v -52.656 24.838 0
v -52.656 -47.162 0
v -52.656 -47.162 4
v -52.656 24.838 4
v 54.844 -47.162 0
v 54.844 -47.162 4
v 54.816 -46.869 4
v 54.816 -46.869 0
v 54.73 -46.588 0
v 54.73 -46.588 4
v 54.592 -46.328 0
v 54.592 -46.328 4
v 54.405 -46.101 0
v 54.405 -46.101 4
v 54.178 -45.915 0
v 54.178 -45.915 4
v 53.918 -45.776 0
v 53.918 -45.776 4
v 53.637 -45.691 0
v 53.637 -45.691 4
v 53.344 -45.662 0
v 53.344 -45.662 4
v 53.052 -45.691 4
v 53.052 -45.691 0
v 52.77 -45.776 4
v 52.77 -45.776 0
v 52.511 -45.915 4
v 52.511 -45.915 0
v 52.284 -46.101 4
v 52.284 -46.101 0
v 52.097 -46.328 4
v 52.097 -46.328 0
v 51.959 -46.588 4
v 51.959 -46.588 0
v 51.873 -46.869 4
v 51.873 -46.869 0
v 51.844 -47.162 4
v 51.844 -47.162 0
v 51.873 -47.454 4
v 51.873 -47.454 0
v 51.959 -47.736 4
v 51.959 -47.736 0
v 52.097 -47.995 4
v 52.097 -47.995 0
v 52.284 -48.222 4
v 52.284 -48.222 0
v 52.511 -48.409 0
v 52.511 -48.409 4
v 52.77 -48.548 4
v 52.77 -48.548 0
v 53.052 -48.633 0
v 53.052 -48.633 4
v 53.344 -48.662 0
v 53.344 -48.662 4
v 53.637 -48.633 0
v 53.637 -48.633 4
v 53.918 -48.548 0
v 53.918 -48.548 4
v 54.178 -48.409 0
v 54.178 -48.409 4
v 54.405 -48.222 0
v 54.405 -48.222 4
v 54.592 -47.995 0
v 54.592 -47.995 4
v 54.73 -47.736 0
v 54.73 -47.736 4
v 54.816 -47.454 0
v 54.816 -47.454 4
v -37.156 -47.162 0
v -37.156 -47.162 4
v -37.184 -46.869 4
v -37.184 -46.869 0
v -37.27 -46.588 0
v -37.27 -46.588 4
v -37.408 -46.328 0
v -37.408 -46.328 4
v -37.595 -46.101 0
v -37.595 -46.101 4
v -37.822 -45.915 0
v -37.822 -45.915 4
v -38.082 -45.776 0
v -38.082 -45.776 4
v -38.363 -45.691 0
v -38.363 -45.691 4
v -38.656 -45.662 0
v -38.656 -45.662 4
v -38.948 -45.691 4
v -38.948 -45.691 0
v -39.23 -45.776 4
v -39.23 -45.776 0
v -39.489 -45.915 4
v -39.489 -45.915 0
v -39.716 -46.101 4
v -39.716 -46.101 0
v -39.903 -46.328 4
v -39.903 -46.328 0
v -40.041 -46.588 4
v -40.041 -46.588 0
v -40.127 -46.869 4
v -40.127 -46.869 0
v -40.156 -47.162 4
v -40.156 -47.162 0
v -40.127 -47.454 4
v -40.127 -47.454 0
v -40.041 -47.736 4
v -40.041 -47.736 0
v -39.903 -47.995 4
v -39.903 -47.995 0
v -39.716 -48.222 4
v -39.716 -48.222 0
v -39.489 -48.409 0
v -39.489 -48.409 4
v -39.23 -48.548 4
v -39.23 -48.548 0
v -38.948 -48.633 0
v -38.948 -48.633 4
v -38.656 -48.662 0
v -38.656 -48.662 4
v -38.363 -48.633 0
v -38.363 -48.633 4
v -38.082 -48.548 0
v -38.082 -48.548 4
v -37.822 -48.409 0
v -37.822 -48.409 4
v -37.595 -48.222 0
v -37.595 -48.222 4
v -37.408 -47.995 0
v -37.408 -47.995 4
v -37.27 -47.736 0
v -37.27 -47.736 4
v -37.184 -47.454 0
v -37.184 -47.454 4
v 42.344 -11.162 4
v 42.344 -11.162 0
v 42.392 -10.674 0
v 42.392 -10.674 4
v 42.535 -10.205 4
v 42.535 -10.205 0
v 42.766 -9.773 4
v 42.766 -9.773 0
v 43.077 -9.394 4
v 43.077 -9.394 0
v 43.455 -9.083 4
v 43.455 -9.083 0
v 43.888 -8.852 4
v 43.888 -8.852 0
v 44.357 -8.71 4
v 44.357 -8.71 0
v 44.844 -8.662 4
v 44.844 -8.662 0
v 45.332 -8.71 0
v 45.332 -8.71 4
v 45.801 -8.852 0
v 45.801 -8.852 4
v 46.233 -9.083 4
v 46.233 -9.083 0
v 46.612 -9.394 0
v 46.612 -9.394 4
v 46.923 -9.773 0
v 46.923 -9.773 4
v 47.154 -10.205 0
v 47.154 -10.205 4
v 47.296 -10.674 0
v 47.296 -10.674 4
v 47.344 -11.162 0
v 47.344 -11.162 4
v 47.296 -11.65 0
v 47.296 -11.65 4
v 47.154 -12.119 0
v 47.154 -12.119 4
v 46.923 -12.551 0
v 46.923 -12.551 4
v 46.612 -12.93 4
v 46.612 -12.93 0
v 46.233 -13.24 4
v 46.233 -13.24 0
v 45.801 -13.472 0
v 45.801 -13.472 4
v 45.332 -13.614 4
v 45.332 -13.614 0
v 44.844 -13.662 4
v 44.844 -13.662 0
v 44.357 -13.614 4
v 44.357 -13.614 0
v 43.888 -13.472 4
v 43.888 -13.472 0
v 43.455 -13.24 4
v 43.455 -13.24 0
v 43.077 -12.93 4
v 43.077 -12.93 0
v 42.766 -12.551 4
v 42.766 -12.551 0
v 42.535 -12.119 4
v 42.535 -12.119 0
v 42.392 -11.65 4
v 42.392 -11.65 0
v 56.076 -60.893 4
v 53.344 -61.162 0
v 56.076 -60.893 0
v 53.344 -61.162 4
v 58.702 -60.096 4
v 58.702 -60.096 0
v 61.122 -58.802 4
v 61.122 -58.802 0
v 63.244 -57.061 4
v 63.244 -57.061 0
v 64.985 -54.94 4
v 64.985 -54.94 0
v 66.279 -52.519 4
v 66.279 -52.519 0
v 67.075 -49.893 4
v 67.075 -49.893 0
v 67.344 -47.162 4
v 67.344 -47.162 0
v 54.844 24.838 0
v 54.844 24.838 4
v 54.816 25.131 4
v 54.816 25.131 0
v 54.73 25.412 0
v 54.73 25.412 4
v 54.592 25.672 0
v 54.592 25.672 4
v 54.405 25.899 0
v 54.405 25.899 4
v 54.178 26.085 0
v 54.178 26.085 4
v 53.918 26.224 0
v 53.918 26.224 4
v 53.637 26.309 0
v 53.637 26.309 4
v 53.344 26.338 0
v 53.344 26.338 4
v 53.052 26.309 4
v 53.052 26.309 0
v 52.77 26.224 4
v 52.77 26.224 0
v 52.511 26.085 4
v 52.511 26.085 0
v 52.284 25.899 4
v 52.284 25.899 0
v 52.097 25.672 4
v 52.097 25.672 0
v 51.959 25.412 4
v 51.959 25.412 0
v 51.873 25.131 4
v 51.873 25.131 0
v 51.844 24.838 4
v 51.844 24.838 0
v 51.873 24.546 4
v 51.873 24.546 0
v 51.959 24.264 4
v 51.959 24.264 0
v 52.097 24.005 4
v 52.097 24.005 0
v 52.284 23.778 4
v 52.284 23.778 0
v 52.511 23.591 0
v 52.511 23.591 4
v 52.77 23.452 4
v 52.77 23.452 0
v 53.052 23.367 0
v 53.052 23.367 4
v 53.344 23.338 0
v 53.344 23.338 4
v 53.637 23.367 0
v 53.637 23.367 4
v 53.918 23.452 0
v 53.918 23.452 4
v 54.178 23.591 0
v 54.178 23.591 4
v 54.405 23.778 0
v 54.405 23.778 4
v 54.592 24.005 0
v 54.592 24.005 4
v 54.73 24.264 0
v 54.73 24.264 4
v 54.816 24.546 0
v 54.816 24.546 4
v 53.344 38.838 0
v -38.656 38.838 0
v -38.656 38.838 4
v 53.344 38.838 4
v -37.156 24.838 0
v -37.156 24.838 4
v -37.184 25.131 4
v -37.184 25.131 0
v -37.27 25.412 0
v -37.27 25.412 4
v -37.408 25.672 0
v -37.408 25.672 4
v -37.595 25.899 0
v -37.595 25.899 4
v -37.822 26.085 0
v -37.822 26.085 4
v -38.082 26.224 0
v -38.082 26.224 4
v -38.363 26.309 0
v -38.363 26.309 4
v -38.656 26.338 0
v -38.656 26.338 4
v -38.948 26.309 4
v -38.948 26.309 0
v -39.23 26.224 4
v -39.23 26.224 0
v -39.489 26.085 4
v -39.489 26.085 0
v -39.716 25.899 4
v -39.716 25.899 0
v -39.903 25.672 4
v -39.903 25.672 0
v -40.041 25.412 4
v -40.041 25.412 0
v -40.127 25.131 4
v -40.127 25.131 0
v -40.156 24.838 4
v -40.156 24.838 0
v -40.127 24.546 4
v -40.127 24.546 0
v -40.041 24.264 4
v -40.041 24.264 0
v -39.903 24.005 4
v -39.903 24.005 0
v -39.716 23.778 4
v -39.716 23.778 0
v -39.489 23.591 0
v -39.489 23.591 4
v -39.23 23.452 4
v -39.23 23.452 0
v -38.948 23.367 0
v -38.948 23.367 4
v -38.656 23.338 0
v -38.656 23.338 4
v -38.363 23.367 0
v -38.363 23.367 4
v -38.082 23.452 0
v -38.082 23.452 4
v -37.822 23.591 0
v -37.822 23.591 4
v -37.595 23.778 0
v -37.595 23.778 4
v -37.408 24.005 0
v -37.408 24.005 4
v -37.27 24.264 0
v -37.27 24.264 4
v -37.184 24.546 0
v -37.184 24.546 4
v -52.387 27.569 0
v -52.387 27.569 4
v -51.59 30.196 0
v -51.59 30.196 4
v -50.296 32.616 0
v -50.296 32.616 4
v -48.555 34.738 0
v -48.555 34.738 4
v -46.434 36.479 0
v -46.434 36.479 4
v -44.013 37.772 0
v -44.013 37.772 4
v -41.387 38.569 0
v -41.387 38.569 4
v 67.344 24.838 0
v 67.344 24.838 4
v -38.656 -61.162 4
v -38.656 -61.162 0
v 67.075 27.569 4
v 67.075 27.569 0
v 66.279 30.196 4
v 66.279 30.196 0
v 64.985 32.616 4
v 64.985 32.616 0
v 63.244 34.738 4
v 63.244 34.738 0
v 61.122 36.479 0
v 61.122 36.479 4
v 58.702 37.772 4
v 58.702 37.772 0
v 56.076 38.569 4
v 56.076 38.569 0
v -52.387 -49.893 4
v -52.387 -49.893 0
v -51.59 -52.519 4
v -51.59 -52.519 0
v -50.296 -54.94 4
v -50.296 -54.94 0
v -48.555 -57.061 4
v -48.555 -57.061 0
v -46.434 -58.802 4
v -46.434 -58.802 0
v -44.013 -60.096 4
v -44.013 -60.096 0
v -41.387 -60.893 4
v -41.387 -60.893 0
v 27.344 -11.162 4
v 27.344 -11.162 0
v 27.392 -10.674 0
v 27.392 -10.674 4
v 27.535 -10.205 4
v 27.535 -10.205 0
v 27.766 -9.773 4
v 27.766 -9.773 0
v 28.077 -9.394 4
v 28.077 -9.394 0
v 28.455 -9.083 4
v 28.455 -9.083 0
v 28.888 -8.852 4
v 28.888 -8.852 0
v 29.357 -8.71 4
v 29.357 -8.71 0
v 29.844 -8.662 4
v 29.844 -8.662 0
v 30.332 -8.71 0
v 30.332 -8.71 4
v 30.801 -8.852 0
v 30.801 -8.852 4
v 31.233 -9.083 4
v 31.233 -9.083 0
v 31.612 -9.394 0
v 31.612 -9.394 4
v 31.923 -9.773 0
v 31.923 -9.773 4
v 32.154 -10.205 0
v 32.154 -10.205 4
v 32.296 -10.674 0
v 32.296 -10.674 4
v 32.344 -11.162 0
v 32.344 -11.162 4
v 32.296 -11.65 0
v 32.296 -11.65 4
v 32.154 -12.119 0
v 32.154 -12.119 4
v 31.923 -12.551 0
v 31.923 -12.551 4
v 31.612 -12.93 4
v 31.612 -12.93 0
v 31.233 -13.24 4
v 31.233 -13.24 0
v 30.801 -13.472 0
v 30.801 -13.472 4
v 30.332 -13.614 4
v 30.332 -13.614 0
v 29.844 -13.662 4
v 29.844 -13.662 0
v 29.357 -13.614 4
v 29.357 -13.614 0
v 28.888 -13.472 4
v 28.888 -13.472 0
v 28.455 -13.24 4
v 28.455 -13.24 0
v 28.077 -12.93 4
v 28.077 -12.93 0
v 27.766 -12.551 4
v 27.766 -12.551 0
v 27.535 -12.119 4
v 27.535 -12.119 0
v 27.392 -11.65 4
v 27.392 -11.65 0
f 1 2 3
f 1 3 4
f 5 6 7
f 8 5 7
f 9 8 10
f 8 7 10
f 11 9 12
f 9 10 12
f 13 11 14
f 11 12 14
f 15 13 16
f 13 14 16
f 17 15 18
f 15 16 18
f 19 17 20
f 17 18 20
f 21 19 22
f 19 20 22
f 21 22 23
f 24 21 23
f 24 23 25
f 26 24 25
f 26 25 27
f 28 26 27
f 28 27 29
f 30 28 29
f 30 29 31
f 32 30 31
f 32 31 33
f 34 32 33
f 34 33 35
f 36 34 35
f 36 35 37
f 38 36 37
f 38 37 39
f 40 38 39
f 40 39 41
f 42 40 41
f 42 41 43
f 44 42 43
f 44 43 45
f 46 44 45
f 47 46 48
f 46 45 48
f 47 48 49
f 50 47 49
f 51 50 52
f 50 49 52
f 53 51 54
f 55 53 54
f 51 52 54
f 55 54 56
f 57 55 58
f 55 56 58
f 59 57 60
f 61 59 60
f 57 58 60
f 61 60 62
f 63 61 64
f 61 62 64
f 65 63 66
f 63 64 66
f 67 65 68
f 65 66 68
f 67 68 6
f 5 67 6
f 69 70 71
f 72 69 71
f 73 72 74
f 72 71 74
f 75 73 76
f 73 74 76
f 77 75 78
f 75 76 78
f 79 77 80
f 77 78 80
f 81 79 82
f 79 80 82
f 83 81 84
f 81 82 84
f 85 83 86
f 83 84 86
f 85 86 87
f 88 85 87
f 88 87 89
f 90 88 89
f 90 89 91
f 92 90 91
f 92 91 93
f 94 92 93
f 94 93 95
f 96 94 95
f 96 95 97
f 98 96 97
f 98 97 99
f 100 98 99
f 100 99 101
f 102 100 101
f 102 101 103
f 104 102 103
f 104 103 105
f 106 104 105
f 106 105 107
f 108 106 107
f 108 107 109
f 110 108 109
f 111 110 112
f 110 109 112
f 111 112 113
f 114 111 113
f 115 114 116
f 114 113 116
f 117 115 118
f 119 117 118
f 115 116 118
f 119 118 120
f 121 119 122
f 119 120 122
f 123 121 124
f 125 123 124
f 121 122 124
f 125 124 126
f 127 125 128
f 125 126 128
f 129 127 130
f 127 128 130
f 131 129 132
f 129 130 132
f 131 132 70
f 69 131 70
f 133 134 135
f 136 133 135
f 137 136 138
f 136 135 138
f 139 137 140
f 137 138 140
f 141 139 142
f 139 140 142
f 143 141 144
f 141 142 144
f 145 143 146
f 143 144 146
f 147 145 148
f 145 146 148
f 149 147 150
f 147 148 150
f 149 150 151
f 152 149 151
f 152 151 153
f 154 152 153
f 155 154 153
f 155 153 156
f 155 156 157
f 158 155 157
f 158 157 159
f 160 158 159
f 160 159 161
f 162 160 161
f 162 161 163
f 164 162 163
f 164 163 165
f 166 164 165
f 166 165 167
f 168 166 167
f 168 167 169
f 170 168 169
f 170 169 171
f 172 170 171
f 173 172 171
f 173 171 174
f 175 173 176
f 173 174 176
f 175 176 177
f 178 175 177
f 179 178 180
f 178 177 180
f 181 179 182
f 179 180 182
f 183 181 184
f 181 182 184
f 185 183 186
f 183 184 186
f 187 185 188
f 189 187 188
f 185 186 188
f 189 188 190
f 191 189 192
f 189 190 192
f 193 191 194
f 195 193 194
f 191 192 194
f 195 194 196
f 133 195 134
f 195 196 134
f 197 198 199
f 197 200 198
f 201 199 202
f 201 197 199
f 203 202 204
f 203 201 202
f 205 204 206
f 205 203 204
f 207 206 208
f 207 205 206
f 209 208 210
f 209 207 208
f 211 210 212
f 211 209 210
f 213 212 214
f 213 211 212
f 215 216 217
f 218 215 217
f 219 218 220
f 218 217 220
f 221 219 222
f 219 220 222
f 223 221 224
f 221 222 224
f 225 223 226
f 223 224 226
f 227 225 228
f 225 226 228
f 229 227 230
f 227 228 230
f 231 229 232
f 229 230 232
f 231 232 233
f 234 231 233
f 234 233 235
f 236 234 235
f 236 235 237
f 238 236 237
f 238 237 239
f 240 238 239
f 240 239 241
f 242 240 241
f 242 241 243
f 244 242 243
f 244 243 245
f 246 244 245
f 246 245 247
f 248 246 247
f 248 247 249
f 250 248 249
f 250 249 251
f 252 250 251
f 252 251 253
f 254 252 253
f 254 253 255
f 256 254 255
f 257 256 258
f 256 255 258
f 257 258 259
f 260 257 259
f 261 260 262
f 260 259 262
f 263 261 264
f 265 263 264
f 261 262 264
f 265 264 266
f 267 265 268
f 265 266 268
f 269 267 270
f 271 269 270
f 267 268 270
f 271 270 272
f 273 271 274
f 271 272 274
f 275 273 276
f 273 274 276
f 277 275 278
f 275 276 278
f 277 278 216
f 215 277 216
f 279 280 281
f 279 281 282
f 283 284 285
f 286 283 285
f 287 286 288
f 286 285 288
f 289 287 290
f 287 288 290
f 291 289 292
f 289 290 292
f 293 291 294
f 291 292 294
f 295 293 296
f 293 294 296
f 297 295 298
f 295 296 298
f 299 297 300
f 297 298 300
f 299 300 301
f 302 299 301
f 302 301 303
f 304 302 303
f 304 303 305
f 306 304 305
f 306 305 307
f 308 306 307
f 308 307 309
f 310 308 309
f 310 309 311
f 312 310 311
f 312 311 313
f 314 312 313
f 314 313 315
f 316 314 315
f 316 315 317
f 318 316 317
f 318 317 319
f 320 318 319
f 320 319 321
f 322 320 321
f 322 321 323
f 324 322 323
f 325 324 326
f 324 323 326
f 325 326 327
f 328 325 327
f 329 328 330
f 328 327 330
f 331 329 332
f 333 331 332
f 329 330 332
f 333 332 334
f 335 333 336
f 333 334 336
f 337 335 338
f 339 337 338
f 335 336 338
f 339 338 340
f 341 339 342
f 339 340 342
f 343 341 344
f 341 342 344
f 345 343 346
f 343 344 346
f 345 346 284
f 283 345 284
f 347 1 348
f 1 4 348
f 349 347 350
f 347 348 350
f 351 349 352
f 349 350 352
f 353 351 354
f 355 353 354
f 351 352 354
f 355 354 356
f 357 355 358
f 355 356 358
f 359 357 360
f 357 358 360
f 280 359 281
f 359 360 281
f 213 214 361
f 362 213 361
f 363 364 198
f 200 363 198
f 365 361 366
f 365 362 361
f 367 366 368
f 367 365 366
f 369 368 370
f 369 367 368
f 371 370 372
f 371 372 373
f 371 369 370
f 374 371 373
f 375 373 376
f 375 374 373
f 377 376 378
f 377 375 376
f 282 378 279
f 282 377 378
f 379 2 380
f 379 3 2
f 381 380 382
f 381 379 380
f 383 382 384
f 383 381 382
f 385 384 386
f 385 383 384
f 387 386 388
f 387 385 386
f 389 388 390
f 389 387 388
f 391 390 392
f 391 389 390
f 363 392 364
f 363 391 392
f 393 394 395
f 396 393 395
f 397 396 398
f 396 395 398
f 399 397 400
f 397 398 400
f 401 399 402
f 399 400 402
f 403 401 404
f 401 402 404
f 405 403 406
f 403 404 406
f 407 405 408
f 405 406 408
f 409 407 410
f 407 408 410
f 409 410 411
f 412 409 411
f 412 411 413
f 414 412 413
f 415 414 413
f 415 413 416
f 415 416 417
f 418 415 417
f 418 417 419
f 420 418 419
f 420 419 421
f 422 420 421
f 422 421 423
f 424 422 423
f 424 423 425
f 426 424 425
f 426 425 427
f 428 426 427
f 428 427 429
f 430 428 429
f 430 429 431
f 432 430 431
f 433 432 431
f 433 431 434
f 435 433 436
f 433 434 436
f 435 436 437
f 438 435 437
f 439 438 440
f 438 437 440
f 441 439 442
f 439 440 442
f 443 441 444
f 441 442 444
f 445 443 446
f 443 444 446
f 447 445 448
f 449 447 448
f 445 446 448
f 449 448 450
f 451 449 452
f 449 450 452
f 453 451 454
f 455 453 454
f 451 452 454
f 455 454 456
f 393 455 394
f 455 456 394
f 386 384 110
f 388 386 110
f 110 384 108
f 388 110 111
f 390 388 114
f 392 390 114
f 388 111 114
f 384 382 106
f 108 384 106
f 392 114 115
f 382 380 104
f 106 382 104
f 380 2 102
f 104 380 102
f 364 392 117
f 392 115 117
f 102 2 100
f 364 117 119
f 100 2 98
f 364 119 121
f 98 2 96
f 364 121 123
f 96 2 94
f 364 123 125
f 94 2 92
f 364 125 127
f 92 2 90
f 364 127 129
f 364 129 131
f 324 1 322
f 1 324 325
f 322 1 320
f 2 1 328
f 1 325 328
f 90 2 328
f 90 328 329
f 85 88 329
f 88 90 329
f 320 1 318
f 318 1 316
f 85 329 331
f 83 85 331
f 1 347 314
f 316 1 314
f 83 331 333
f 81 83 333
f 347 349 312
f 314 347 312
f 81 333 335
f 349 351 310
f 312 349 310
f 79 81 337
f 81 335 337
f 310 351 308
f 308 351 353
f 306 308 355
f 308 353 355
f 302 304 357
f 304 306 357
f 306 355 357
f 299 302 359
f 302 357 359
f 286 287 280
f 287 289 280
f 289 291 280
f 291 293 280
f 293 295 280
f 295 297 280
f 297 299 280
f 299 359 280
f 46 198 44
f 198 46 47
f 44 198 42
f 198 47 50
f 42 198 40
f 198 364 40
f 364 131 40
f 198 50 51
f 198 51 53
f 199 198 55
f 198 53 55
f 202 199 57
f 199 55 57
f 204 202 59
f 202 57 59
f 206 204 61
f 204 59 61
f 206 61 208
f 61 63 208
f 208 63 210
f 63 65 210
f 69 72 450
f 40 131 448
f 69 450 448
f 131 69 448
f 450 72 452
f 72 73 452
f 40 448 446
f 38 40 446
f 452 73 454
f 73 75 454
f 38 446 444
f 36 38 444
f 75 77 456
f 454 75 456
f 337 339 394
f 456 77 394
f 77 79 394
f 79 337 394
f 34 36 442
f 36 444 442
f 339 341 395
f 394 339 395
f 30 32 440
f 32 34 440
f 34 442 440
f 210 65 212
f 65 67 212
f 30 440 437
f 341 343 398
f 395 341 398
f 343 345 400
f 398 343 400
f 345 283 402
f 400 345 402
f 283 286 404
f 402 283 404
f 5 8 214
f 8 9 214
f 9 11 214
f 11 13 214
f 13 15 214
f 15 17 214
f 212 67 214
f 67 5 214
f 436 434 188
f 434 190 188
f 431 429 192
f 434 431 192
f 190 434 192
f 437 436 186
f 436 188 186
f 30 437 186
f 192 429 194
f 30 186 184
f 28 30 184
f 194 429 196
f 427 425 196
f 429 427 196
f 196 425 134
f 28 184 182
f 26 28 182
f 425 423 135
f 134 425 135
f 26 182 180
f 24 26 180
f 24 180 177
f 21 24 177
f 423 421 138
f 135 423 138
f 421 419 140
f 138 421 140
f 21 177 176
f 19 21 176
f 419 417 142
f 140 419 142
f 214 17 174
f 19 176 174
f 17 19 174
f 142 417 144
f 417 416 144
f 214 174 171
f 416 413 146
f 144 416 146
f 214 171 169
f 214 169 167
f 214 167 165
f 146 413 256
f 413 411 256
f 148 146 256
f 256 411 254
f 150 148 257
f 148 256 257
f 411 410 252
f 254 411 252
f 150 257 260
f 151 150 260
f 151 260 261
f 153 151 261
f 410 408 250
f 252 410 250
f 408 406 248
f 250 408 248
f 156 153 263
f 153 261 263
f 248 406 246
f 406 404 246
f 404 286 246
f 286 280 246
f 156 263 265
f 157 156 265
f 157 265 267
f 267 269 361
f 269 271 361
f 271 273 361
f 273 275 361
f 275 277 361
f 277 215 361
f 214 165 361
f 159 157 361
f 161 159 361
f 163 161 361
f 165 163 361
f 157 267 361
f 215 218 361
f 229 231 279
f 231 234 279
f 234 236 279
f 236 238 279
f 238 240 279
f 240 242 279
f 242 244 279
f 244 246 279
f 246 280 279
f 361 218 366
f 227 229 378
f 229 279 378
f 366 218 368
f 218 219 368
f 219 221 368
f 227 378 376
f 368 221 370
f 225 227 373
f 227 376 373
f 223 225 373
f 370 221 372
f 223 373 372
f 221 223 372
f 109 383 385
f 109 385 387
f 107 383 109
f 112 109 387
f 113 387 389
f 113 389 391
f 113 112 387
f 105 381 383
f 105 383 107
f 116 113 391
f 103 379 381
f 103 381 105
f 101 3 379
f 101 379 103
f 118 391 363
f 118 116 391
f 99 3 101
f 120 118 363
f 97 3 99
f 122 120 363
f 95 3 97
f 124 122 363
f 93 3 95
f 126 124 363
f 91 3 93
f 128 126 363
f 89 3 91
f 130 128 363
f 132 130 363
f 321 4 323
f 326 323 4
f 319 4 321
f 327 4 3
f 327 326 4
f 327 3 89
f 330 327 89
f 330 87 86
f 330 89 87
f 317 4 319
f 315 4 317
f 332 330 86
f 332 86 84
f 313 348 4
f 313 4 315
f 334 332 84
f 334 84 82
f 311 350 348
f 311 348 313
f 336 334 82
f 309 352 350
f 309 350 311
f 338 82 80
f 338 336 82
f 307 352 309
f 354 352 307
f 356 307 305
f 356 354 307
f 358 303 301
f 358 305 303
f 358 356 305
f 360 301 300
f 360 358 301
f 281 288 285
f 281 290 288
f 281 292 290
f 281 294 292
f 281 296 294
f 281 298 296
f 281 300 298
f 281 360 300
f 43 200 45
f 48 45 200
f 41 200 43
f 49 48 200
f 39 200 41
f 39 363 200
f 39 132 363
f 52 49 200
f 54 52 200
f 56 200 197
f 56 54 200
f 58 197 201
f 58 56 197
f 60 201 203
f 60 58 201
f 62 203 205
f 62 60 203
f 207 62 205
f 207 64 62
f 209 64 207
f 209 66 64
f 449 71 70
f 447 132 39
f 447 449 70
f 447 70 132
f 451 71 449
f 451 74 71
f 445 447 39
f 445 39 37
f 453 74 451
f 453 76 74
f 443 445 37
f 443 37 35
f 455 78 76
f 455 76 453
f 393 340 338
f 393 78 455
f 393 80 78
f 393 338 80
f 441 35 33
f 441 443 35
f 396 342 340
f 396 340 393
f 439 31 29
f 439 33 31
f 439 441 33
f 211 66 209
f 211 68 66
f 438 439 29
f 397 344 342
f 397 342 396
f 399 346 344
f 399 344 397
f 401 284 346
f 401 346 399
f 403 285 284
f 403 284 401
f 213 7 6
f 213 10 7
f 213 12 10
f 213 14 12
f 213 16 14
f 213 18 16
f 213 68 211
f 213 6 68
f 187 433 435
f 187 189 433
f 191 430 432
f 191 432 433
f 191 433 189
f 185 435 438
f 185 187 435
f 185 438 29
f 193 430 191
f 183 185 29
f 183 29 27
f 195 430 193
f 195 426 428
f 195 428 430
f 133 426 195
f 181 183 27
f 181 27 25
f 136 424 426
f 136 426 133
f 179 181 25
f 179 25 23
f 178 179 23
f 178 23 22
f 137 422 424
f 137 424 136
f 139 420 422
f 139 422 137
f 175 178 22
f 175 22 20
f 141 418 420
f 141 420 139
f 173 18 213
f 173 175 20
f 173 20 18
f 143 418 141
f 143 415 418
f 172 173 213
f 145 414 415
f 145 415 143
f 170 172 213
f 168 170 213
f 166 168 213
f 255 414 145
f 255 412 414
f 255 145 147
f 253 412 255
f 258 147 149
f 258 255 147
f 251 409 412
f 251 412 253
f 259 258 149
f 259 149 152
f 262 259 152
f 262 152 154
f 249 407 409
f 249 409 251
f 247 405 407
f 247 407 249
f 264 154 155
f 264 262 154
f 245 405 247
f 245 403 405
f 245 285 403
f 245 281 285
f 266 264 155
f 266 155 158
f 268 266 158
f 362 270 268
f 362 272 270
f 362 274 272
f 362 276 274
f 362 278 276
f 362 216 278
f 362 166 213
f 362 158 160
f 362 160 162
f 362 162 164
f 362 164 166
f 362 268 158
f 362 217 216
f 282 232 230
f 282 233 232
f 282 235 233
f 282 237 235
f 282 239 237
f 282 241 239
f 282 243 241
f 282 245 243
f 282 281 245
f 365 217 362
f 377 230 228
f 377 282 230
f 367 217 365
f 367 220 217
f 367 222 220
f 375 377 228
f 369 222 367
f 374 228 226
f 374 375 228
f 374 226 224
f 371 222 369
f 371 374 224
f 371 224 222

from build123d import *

# Parameters (mm, degrees)
SKETCH_1_W          = 120
SKETCH_1_H          = 100
EXTRUDE_1_DEPTH     = 4
FILLET_1_R          = 14
SKETCH_2_R          = 1.5
CUT_EXTRUDE_1_DEPTH = 5
SKETCH_7_R          = 2.5
CUT_EXTRUDE_2_DEPTH = 5


with BuildPart() as part:
    # 草图1 → 凸台-拉伸1 (new body)
    with BuildSketch(Plane.XY):
        with Locations((7.34439834, -11.161825726)):
            Rectangle(SKETCH_1_W, SKETCH_1_H)
    extrude(amount=EXTRUDE_1_DEPTH)

    # 圆角1
    fillet_1_edges = [part.edges().sort_by_distance(p)[0] for p in [
        (-52.65560166, 38.838174274, 2),
        (67.34439834, 38.838174274, 2),
        (67.34439834, -61.161825726, 2),
        (-52.65560166, -61.161825726, 2),
    ]]
    fillet(fillet_1_edges, radius=FILLET_1_R)

    # 草图2 → 切除-拉伸1 (cut, through all)
    with BuildSketch(Plane.XY.offset(4)):
        with Locations((53.34439834, 24.838174274)):
            Circle(SKETCH_2_R)
        with Locations((-38.65560166, 24.838174274)):
            Circle(SKETCH_2_R)
        with Locations((-38.65560166, -47.161825726)):
            Circle(SKETCH_2_R)
        with Locations((53.34439834, -47.161825726)):
            Circle(SKETCH_2_R)
    extrude(amount=-CUT_EXTRUDE_1_DEPTH, mode=Mode.SUBTRACT)

    # 草图7 → 切除-拉伸2 (cut, through all)
    with BuildSketch(Plane(origin=(0, 0, 0), x_dir=(-1, 0, 0), z_dir=(0, 0, -1))):
        with Locations((-44.84439834, -11.161825726)):
            Circle(SKETCH_7_R)
        with Locations((-29.84439834, -11.161825726)):
            Circle(SKETCH_7_R)
    extrude(amount=-CUT_EXTRUDE_2_DEPTH, mode=Mode.SUBTRACT)


solid = part.part
